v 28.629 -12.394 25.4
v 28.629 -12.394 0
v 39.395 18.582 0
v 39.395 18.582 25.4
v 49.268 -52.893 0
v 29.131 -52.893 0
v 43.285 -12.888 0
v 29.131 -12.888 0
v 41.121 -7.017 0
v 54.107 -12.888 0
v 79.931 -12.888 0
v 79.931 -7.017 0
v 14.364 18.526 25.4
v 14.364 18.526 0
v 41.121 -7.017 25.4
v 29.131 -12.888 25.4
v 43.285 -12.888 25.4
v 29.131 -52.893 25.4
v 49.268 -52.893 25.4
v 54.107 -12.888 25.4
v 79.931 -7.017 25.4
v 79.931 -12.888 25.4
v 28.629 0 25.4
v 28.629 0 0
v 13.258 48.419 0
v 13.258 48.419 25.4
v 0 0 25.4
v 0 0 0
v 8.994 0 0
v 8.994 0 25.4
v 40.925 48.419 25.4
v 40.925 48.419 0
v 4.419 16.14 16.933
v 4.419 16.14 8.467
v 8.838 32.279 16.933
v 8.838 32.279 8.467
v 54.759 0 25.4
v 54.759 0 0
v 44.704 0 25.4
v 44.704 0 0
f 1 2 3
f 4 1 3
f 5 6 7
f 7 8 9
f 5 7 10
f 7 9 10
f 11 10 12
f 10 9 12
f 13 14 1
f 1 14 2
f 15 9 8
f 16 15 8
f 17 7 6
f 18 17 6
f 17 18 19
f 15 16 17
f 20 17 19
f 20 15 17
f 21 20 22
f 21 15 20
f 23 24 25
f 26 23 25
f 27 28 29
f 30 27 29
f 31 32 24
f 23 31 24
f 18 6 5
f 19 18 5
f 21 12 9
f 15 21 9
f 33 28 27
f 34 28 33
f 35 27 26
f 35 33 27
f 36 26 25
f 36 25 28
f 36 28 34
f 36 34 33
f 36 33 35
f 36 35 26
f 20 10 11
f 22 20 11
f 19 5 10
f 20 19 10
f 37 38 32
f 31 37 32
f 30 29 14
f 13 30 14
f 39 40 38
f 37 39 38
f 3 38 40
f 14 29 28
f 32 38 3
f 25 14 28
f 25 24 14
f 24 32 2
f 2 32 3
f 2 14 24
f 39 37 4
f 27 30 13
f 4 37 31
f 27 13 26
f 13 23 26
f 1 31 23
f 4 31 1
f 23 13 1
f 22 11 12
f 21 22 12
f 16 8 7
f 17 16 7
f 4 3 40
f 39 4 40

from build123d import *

# Parameters (mm, degrees)
F1_DEPTH = 25.4
F3_DEPTH = 25.4


with BuildPart() as f1:
    # F0 (on Top) → F1 (new body)
    with BuildSketch(Plane.XY):
        with BuildLine():
            add(Edge.make_bspline(
                [(0, 0), (4.419168, 16.139571), (8.838336, 32.279142), (13.257504, 48.418713)],
                knots=[0, 0, 0, 0, 50.200928, 50.200928, 50.200928, 50.200928], degree=3))
            Line((0, 0), (8.994412, 0))
            Line((8.994412, 0), (14.364212, 18.525805))
            Line((14.364212, 18.525805), (28.628522, -12.394215))
            Line((28.628522, -12.394215), (39.394563, 18.581529))
            Line((39.394563, 18.581529), (44.703573, 0))
            Line((44.703573, 0), (54.759262, 0))
            Line((54.759262, 0), (40.925339, 48.418713))
            Line((40.925339, 48.418713), (28.628522, 0))
            Line((28.628522, 0), (13.257504, 48.418713))
        make_face()
    extrude(amount=F1_DEPTH)


with BuildPart() as f3:
    # F2 (on Top) → F3 (new body)
    with BuildSketch(Plane.XY):
        Polygon((41.120518, -7.016588), (29.131159, -12.887516), (43.284501, -12.887516), (45.361572, -7.016588), align=None)
        Polygon((45.361572, -7.016588), (43.284501, -12.887516), (54.106556, -12.887516), (54.816652, -7.016588), align=None)
        Polygon((54.106556, -12.887516), (43.284501, -12.887516), (29.131159, -52.892517), (49.267903, -52.892517), align=None)
        Polygon((54.816652, -7.016588), (54.106556, -12.887516), (79.931159, -12.887516), (79.931159, -7.016588), align=None)
    extrude(amount=F3_DEPTH)


solid = Compound([f1.part, f3.part])
